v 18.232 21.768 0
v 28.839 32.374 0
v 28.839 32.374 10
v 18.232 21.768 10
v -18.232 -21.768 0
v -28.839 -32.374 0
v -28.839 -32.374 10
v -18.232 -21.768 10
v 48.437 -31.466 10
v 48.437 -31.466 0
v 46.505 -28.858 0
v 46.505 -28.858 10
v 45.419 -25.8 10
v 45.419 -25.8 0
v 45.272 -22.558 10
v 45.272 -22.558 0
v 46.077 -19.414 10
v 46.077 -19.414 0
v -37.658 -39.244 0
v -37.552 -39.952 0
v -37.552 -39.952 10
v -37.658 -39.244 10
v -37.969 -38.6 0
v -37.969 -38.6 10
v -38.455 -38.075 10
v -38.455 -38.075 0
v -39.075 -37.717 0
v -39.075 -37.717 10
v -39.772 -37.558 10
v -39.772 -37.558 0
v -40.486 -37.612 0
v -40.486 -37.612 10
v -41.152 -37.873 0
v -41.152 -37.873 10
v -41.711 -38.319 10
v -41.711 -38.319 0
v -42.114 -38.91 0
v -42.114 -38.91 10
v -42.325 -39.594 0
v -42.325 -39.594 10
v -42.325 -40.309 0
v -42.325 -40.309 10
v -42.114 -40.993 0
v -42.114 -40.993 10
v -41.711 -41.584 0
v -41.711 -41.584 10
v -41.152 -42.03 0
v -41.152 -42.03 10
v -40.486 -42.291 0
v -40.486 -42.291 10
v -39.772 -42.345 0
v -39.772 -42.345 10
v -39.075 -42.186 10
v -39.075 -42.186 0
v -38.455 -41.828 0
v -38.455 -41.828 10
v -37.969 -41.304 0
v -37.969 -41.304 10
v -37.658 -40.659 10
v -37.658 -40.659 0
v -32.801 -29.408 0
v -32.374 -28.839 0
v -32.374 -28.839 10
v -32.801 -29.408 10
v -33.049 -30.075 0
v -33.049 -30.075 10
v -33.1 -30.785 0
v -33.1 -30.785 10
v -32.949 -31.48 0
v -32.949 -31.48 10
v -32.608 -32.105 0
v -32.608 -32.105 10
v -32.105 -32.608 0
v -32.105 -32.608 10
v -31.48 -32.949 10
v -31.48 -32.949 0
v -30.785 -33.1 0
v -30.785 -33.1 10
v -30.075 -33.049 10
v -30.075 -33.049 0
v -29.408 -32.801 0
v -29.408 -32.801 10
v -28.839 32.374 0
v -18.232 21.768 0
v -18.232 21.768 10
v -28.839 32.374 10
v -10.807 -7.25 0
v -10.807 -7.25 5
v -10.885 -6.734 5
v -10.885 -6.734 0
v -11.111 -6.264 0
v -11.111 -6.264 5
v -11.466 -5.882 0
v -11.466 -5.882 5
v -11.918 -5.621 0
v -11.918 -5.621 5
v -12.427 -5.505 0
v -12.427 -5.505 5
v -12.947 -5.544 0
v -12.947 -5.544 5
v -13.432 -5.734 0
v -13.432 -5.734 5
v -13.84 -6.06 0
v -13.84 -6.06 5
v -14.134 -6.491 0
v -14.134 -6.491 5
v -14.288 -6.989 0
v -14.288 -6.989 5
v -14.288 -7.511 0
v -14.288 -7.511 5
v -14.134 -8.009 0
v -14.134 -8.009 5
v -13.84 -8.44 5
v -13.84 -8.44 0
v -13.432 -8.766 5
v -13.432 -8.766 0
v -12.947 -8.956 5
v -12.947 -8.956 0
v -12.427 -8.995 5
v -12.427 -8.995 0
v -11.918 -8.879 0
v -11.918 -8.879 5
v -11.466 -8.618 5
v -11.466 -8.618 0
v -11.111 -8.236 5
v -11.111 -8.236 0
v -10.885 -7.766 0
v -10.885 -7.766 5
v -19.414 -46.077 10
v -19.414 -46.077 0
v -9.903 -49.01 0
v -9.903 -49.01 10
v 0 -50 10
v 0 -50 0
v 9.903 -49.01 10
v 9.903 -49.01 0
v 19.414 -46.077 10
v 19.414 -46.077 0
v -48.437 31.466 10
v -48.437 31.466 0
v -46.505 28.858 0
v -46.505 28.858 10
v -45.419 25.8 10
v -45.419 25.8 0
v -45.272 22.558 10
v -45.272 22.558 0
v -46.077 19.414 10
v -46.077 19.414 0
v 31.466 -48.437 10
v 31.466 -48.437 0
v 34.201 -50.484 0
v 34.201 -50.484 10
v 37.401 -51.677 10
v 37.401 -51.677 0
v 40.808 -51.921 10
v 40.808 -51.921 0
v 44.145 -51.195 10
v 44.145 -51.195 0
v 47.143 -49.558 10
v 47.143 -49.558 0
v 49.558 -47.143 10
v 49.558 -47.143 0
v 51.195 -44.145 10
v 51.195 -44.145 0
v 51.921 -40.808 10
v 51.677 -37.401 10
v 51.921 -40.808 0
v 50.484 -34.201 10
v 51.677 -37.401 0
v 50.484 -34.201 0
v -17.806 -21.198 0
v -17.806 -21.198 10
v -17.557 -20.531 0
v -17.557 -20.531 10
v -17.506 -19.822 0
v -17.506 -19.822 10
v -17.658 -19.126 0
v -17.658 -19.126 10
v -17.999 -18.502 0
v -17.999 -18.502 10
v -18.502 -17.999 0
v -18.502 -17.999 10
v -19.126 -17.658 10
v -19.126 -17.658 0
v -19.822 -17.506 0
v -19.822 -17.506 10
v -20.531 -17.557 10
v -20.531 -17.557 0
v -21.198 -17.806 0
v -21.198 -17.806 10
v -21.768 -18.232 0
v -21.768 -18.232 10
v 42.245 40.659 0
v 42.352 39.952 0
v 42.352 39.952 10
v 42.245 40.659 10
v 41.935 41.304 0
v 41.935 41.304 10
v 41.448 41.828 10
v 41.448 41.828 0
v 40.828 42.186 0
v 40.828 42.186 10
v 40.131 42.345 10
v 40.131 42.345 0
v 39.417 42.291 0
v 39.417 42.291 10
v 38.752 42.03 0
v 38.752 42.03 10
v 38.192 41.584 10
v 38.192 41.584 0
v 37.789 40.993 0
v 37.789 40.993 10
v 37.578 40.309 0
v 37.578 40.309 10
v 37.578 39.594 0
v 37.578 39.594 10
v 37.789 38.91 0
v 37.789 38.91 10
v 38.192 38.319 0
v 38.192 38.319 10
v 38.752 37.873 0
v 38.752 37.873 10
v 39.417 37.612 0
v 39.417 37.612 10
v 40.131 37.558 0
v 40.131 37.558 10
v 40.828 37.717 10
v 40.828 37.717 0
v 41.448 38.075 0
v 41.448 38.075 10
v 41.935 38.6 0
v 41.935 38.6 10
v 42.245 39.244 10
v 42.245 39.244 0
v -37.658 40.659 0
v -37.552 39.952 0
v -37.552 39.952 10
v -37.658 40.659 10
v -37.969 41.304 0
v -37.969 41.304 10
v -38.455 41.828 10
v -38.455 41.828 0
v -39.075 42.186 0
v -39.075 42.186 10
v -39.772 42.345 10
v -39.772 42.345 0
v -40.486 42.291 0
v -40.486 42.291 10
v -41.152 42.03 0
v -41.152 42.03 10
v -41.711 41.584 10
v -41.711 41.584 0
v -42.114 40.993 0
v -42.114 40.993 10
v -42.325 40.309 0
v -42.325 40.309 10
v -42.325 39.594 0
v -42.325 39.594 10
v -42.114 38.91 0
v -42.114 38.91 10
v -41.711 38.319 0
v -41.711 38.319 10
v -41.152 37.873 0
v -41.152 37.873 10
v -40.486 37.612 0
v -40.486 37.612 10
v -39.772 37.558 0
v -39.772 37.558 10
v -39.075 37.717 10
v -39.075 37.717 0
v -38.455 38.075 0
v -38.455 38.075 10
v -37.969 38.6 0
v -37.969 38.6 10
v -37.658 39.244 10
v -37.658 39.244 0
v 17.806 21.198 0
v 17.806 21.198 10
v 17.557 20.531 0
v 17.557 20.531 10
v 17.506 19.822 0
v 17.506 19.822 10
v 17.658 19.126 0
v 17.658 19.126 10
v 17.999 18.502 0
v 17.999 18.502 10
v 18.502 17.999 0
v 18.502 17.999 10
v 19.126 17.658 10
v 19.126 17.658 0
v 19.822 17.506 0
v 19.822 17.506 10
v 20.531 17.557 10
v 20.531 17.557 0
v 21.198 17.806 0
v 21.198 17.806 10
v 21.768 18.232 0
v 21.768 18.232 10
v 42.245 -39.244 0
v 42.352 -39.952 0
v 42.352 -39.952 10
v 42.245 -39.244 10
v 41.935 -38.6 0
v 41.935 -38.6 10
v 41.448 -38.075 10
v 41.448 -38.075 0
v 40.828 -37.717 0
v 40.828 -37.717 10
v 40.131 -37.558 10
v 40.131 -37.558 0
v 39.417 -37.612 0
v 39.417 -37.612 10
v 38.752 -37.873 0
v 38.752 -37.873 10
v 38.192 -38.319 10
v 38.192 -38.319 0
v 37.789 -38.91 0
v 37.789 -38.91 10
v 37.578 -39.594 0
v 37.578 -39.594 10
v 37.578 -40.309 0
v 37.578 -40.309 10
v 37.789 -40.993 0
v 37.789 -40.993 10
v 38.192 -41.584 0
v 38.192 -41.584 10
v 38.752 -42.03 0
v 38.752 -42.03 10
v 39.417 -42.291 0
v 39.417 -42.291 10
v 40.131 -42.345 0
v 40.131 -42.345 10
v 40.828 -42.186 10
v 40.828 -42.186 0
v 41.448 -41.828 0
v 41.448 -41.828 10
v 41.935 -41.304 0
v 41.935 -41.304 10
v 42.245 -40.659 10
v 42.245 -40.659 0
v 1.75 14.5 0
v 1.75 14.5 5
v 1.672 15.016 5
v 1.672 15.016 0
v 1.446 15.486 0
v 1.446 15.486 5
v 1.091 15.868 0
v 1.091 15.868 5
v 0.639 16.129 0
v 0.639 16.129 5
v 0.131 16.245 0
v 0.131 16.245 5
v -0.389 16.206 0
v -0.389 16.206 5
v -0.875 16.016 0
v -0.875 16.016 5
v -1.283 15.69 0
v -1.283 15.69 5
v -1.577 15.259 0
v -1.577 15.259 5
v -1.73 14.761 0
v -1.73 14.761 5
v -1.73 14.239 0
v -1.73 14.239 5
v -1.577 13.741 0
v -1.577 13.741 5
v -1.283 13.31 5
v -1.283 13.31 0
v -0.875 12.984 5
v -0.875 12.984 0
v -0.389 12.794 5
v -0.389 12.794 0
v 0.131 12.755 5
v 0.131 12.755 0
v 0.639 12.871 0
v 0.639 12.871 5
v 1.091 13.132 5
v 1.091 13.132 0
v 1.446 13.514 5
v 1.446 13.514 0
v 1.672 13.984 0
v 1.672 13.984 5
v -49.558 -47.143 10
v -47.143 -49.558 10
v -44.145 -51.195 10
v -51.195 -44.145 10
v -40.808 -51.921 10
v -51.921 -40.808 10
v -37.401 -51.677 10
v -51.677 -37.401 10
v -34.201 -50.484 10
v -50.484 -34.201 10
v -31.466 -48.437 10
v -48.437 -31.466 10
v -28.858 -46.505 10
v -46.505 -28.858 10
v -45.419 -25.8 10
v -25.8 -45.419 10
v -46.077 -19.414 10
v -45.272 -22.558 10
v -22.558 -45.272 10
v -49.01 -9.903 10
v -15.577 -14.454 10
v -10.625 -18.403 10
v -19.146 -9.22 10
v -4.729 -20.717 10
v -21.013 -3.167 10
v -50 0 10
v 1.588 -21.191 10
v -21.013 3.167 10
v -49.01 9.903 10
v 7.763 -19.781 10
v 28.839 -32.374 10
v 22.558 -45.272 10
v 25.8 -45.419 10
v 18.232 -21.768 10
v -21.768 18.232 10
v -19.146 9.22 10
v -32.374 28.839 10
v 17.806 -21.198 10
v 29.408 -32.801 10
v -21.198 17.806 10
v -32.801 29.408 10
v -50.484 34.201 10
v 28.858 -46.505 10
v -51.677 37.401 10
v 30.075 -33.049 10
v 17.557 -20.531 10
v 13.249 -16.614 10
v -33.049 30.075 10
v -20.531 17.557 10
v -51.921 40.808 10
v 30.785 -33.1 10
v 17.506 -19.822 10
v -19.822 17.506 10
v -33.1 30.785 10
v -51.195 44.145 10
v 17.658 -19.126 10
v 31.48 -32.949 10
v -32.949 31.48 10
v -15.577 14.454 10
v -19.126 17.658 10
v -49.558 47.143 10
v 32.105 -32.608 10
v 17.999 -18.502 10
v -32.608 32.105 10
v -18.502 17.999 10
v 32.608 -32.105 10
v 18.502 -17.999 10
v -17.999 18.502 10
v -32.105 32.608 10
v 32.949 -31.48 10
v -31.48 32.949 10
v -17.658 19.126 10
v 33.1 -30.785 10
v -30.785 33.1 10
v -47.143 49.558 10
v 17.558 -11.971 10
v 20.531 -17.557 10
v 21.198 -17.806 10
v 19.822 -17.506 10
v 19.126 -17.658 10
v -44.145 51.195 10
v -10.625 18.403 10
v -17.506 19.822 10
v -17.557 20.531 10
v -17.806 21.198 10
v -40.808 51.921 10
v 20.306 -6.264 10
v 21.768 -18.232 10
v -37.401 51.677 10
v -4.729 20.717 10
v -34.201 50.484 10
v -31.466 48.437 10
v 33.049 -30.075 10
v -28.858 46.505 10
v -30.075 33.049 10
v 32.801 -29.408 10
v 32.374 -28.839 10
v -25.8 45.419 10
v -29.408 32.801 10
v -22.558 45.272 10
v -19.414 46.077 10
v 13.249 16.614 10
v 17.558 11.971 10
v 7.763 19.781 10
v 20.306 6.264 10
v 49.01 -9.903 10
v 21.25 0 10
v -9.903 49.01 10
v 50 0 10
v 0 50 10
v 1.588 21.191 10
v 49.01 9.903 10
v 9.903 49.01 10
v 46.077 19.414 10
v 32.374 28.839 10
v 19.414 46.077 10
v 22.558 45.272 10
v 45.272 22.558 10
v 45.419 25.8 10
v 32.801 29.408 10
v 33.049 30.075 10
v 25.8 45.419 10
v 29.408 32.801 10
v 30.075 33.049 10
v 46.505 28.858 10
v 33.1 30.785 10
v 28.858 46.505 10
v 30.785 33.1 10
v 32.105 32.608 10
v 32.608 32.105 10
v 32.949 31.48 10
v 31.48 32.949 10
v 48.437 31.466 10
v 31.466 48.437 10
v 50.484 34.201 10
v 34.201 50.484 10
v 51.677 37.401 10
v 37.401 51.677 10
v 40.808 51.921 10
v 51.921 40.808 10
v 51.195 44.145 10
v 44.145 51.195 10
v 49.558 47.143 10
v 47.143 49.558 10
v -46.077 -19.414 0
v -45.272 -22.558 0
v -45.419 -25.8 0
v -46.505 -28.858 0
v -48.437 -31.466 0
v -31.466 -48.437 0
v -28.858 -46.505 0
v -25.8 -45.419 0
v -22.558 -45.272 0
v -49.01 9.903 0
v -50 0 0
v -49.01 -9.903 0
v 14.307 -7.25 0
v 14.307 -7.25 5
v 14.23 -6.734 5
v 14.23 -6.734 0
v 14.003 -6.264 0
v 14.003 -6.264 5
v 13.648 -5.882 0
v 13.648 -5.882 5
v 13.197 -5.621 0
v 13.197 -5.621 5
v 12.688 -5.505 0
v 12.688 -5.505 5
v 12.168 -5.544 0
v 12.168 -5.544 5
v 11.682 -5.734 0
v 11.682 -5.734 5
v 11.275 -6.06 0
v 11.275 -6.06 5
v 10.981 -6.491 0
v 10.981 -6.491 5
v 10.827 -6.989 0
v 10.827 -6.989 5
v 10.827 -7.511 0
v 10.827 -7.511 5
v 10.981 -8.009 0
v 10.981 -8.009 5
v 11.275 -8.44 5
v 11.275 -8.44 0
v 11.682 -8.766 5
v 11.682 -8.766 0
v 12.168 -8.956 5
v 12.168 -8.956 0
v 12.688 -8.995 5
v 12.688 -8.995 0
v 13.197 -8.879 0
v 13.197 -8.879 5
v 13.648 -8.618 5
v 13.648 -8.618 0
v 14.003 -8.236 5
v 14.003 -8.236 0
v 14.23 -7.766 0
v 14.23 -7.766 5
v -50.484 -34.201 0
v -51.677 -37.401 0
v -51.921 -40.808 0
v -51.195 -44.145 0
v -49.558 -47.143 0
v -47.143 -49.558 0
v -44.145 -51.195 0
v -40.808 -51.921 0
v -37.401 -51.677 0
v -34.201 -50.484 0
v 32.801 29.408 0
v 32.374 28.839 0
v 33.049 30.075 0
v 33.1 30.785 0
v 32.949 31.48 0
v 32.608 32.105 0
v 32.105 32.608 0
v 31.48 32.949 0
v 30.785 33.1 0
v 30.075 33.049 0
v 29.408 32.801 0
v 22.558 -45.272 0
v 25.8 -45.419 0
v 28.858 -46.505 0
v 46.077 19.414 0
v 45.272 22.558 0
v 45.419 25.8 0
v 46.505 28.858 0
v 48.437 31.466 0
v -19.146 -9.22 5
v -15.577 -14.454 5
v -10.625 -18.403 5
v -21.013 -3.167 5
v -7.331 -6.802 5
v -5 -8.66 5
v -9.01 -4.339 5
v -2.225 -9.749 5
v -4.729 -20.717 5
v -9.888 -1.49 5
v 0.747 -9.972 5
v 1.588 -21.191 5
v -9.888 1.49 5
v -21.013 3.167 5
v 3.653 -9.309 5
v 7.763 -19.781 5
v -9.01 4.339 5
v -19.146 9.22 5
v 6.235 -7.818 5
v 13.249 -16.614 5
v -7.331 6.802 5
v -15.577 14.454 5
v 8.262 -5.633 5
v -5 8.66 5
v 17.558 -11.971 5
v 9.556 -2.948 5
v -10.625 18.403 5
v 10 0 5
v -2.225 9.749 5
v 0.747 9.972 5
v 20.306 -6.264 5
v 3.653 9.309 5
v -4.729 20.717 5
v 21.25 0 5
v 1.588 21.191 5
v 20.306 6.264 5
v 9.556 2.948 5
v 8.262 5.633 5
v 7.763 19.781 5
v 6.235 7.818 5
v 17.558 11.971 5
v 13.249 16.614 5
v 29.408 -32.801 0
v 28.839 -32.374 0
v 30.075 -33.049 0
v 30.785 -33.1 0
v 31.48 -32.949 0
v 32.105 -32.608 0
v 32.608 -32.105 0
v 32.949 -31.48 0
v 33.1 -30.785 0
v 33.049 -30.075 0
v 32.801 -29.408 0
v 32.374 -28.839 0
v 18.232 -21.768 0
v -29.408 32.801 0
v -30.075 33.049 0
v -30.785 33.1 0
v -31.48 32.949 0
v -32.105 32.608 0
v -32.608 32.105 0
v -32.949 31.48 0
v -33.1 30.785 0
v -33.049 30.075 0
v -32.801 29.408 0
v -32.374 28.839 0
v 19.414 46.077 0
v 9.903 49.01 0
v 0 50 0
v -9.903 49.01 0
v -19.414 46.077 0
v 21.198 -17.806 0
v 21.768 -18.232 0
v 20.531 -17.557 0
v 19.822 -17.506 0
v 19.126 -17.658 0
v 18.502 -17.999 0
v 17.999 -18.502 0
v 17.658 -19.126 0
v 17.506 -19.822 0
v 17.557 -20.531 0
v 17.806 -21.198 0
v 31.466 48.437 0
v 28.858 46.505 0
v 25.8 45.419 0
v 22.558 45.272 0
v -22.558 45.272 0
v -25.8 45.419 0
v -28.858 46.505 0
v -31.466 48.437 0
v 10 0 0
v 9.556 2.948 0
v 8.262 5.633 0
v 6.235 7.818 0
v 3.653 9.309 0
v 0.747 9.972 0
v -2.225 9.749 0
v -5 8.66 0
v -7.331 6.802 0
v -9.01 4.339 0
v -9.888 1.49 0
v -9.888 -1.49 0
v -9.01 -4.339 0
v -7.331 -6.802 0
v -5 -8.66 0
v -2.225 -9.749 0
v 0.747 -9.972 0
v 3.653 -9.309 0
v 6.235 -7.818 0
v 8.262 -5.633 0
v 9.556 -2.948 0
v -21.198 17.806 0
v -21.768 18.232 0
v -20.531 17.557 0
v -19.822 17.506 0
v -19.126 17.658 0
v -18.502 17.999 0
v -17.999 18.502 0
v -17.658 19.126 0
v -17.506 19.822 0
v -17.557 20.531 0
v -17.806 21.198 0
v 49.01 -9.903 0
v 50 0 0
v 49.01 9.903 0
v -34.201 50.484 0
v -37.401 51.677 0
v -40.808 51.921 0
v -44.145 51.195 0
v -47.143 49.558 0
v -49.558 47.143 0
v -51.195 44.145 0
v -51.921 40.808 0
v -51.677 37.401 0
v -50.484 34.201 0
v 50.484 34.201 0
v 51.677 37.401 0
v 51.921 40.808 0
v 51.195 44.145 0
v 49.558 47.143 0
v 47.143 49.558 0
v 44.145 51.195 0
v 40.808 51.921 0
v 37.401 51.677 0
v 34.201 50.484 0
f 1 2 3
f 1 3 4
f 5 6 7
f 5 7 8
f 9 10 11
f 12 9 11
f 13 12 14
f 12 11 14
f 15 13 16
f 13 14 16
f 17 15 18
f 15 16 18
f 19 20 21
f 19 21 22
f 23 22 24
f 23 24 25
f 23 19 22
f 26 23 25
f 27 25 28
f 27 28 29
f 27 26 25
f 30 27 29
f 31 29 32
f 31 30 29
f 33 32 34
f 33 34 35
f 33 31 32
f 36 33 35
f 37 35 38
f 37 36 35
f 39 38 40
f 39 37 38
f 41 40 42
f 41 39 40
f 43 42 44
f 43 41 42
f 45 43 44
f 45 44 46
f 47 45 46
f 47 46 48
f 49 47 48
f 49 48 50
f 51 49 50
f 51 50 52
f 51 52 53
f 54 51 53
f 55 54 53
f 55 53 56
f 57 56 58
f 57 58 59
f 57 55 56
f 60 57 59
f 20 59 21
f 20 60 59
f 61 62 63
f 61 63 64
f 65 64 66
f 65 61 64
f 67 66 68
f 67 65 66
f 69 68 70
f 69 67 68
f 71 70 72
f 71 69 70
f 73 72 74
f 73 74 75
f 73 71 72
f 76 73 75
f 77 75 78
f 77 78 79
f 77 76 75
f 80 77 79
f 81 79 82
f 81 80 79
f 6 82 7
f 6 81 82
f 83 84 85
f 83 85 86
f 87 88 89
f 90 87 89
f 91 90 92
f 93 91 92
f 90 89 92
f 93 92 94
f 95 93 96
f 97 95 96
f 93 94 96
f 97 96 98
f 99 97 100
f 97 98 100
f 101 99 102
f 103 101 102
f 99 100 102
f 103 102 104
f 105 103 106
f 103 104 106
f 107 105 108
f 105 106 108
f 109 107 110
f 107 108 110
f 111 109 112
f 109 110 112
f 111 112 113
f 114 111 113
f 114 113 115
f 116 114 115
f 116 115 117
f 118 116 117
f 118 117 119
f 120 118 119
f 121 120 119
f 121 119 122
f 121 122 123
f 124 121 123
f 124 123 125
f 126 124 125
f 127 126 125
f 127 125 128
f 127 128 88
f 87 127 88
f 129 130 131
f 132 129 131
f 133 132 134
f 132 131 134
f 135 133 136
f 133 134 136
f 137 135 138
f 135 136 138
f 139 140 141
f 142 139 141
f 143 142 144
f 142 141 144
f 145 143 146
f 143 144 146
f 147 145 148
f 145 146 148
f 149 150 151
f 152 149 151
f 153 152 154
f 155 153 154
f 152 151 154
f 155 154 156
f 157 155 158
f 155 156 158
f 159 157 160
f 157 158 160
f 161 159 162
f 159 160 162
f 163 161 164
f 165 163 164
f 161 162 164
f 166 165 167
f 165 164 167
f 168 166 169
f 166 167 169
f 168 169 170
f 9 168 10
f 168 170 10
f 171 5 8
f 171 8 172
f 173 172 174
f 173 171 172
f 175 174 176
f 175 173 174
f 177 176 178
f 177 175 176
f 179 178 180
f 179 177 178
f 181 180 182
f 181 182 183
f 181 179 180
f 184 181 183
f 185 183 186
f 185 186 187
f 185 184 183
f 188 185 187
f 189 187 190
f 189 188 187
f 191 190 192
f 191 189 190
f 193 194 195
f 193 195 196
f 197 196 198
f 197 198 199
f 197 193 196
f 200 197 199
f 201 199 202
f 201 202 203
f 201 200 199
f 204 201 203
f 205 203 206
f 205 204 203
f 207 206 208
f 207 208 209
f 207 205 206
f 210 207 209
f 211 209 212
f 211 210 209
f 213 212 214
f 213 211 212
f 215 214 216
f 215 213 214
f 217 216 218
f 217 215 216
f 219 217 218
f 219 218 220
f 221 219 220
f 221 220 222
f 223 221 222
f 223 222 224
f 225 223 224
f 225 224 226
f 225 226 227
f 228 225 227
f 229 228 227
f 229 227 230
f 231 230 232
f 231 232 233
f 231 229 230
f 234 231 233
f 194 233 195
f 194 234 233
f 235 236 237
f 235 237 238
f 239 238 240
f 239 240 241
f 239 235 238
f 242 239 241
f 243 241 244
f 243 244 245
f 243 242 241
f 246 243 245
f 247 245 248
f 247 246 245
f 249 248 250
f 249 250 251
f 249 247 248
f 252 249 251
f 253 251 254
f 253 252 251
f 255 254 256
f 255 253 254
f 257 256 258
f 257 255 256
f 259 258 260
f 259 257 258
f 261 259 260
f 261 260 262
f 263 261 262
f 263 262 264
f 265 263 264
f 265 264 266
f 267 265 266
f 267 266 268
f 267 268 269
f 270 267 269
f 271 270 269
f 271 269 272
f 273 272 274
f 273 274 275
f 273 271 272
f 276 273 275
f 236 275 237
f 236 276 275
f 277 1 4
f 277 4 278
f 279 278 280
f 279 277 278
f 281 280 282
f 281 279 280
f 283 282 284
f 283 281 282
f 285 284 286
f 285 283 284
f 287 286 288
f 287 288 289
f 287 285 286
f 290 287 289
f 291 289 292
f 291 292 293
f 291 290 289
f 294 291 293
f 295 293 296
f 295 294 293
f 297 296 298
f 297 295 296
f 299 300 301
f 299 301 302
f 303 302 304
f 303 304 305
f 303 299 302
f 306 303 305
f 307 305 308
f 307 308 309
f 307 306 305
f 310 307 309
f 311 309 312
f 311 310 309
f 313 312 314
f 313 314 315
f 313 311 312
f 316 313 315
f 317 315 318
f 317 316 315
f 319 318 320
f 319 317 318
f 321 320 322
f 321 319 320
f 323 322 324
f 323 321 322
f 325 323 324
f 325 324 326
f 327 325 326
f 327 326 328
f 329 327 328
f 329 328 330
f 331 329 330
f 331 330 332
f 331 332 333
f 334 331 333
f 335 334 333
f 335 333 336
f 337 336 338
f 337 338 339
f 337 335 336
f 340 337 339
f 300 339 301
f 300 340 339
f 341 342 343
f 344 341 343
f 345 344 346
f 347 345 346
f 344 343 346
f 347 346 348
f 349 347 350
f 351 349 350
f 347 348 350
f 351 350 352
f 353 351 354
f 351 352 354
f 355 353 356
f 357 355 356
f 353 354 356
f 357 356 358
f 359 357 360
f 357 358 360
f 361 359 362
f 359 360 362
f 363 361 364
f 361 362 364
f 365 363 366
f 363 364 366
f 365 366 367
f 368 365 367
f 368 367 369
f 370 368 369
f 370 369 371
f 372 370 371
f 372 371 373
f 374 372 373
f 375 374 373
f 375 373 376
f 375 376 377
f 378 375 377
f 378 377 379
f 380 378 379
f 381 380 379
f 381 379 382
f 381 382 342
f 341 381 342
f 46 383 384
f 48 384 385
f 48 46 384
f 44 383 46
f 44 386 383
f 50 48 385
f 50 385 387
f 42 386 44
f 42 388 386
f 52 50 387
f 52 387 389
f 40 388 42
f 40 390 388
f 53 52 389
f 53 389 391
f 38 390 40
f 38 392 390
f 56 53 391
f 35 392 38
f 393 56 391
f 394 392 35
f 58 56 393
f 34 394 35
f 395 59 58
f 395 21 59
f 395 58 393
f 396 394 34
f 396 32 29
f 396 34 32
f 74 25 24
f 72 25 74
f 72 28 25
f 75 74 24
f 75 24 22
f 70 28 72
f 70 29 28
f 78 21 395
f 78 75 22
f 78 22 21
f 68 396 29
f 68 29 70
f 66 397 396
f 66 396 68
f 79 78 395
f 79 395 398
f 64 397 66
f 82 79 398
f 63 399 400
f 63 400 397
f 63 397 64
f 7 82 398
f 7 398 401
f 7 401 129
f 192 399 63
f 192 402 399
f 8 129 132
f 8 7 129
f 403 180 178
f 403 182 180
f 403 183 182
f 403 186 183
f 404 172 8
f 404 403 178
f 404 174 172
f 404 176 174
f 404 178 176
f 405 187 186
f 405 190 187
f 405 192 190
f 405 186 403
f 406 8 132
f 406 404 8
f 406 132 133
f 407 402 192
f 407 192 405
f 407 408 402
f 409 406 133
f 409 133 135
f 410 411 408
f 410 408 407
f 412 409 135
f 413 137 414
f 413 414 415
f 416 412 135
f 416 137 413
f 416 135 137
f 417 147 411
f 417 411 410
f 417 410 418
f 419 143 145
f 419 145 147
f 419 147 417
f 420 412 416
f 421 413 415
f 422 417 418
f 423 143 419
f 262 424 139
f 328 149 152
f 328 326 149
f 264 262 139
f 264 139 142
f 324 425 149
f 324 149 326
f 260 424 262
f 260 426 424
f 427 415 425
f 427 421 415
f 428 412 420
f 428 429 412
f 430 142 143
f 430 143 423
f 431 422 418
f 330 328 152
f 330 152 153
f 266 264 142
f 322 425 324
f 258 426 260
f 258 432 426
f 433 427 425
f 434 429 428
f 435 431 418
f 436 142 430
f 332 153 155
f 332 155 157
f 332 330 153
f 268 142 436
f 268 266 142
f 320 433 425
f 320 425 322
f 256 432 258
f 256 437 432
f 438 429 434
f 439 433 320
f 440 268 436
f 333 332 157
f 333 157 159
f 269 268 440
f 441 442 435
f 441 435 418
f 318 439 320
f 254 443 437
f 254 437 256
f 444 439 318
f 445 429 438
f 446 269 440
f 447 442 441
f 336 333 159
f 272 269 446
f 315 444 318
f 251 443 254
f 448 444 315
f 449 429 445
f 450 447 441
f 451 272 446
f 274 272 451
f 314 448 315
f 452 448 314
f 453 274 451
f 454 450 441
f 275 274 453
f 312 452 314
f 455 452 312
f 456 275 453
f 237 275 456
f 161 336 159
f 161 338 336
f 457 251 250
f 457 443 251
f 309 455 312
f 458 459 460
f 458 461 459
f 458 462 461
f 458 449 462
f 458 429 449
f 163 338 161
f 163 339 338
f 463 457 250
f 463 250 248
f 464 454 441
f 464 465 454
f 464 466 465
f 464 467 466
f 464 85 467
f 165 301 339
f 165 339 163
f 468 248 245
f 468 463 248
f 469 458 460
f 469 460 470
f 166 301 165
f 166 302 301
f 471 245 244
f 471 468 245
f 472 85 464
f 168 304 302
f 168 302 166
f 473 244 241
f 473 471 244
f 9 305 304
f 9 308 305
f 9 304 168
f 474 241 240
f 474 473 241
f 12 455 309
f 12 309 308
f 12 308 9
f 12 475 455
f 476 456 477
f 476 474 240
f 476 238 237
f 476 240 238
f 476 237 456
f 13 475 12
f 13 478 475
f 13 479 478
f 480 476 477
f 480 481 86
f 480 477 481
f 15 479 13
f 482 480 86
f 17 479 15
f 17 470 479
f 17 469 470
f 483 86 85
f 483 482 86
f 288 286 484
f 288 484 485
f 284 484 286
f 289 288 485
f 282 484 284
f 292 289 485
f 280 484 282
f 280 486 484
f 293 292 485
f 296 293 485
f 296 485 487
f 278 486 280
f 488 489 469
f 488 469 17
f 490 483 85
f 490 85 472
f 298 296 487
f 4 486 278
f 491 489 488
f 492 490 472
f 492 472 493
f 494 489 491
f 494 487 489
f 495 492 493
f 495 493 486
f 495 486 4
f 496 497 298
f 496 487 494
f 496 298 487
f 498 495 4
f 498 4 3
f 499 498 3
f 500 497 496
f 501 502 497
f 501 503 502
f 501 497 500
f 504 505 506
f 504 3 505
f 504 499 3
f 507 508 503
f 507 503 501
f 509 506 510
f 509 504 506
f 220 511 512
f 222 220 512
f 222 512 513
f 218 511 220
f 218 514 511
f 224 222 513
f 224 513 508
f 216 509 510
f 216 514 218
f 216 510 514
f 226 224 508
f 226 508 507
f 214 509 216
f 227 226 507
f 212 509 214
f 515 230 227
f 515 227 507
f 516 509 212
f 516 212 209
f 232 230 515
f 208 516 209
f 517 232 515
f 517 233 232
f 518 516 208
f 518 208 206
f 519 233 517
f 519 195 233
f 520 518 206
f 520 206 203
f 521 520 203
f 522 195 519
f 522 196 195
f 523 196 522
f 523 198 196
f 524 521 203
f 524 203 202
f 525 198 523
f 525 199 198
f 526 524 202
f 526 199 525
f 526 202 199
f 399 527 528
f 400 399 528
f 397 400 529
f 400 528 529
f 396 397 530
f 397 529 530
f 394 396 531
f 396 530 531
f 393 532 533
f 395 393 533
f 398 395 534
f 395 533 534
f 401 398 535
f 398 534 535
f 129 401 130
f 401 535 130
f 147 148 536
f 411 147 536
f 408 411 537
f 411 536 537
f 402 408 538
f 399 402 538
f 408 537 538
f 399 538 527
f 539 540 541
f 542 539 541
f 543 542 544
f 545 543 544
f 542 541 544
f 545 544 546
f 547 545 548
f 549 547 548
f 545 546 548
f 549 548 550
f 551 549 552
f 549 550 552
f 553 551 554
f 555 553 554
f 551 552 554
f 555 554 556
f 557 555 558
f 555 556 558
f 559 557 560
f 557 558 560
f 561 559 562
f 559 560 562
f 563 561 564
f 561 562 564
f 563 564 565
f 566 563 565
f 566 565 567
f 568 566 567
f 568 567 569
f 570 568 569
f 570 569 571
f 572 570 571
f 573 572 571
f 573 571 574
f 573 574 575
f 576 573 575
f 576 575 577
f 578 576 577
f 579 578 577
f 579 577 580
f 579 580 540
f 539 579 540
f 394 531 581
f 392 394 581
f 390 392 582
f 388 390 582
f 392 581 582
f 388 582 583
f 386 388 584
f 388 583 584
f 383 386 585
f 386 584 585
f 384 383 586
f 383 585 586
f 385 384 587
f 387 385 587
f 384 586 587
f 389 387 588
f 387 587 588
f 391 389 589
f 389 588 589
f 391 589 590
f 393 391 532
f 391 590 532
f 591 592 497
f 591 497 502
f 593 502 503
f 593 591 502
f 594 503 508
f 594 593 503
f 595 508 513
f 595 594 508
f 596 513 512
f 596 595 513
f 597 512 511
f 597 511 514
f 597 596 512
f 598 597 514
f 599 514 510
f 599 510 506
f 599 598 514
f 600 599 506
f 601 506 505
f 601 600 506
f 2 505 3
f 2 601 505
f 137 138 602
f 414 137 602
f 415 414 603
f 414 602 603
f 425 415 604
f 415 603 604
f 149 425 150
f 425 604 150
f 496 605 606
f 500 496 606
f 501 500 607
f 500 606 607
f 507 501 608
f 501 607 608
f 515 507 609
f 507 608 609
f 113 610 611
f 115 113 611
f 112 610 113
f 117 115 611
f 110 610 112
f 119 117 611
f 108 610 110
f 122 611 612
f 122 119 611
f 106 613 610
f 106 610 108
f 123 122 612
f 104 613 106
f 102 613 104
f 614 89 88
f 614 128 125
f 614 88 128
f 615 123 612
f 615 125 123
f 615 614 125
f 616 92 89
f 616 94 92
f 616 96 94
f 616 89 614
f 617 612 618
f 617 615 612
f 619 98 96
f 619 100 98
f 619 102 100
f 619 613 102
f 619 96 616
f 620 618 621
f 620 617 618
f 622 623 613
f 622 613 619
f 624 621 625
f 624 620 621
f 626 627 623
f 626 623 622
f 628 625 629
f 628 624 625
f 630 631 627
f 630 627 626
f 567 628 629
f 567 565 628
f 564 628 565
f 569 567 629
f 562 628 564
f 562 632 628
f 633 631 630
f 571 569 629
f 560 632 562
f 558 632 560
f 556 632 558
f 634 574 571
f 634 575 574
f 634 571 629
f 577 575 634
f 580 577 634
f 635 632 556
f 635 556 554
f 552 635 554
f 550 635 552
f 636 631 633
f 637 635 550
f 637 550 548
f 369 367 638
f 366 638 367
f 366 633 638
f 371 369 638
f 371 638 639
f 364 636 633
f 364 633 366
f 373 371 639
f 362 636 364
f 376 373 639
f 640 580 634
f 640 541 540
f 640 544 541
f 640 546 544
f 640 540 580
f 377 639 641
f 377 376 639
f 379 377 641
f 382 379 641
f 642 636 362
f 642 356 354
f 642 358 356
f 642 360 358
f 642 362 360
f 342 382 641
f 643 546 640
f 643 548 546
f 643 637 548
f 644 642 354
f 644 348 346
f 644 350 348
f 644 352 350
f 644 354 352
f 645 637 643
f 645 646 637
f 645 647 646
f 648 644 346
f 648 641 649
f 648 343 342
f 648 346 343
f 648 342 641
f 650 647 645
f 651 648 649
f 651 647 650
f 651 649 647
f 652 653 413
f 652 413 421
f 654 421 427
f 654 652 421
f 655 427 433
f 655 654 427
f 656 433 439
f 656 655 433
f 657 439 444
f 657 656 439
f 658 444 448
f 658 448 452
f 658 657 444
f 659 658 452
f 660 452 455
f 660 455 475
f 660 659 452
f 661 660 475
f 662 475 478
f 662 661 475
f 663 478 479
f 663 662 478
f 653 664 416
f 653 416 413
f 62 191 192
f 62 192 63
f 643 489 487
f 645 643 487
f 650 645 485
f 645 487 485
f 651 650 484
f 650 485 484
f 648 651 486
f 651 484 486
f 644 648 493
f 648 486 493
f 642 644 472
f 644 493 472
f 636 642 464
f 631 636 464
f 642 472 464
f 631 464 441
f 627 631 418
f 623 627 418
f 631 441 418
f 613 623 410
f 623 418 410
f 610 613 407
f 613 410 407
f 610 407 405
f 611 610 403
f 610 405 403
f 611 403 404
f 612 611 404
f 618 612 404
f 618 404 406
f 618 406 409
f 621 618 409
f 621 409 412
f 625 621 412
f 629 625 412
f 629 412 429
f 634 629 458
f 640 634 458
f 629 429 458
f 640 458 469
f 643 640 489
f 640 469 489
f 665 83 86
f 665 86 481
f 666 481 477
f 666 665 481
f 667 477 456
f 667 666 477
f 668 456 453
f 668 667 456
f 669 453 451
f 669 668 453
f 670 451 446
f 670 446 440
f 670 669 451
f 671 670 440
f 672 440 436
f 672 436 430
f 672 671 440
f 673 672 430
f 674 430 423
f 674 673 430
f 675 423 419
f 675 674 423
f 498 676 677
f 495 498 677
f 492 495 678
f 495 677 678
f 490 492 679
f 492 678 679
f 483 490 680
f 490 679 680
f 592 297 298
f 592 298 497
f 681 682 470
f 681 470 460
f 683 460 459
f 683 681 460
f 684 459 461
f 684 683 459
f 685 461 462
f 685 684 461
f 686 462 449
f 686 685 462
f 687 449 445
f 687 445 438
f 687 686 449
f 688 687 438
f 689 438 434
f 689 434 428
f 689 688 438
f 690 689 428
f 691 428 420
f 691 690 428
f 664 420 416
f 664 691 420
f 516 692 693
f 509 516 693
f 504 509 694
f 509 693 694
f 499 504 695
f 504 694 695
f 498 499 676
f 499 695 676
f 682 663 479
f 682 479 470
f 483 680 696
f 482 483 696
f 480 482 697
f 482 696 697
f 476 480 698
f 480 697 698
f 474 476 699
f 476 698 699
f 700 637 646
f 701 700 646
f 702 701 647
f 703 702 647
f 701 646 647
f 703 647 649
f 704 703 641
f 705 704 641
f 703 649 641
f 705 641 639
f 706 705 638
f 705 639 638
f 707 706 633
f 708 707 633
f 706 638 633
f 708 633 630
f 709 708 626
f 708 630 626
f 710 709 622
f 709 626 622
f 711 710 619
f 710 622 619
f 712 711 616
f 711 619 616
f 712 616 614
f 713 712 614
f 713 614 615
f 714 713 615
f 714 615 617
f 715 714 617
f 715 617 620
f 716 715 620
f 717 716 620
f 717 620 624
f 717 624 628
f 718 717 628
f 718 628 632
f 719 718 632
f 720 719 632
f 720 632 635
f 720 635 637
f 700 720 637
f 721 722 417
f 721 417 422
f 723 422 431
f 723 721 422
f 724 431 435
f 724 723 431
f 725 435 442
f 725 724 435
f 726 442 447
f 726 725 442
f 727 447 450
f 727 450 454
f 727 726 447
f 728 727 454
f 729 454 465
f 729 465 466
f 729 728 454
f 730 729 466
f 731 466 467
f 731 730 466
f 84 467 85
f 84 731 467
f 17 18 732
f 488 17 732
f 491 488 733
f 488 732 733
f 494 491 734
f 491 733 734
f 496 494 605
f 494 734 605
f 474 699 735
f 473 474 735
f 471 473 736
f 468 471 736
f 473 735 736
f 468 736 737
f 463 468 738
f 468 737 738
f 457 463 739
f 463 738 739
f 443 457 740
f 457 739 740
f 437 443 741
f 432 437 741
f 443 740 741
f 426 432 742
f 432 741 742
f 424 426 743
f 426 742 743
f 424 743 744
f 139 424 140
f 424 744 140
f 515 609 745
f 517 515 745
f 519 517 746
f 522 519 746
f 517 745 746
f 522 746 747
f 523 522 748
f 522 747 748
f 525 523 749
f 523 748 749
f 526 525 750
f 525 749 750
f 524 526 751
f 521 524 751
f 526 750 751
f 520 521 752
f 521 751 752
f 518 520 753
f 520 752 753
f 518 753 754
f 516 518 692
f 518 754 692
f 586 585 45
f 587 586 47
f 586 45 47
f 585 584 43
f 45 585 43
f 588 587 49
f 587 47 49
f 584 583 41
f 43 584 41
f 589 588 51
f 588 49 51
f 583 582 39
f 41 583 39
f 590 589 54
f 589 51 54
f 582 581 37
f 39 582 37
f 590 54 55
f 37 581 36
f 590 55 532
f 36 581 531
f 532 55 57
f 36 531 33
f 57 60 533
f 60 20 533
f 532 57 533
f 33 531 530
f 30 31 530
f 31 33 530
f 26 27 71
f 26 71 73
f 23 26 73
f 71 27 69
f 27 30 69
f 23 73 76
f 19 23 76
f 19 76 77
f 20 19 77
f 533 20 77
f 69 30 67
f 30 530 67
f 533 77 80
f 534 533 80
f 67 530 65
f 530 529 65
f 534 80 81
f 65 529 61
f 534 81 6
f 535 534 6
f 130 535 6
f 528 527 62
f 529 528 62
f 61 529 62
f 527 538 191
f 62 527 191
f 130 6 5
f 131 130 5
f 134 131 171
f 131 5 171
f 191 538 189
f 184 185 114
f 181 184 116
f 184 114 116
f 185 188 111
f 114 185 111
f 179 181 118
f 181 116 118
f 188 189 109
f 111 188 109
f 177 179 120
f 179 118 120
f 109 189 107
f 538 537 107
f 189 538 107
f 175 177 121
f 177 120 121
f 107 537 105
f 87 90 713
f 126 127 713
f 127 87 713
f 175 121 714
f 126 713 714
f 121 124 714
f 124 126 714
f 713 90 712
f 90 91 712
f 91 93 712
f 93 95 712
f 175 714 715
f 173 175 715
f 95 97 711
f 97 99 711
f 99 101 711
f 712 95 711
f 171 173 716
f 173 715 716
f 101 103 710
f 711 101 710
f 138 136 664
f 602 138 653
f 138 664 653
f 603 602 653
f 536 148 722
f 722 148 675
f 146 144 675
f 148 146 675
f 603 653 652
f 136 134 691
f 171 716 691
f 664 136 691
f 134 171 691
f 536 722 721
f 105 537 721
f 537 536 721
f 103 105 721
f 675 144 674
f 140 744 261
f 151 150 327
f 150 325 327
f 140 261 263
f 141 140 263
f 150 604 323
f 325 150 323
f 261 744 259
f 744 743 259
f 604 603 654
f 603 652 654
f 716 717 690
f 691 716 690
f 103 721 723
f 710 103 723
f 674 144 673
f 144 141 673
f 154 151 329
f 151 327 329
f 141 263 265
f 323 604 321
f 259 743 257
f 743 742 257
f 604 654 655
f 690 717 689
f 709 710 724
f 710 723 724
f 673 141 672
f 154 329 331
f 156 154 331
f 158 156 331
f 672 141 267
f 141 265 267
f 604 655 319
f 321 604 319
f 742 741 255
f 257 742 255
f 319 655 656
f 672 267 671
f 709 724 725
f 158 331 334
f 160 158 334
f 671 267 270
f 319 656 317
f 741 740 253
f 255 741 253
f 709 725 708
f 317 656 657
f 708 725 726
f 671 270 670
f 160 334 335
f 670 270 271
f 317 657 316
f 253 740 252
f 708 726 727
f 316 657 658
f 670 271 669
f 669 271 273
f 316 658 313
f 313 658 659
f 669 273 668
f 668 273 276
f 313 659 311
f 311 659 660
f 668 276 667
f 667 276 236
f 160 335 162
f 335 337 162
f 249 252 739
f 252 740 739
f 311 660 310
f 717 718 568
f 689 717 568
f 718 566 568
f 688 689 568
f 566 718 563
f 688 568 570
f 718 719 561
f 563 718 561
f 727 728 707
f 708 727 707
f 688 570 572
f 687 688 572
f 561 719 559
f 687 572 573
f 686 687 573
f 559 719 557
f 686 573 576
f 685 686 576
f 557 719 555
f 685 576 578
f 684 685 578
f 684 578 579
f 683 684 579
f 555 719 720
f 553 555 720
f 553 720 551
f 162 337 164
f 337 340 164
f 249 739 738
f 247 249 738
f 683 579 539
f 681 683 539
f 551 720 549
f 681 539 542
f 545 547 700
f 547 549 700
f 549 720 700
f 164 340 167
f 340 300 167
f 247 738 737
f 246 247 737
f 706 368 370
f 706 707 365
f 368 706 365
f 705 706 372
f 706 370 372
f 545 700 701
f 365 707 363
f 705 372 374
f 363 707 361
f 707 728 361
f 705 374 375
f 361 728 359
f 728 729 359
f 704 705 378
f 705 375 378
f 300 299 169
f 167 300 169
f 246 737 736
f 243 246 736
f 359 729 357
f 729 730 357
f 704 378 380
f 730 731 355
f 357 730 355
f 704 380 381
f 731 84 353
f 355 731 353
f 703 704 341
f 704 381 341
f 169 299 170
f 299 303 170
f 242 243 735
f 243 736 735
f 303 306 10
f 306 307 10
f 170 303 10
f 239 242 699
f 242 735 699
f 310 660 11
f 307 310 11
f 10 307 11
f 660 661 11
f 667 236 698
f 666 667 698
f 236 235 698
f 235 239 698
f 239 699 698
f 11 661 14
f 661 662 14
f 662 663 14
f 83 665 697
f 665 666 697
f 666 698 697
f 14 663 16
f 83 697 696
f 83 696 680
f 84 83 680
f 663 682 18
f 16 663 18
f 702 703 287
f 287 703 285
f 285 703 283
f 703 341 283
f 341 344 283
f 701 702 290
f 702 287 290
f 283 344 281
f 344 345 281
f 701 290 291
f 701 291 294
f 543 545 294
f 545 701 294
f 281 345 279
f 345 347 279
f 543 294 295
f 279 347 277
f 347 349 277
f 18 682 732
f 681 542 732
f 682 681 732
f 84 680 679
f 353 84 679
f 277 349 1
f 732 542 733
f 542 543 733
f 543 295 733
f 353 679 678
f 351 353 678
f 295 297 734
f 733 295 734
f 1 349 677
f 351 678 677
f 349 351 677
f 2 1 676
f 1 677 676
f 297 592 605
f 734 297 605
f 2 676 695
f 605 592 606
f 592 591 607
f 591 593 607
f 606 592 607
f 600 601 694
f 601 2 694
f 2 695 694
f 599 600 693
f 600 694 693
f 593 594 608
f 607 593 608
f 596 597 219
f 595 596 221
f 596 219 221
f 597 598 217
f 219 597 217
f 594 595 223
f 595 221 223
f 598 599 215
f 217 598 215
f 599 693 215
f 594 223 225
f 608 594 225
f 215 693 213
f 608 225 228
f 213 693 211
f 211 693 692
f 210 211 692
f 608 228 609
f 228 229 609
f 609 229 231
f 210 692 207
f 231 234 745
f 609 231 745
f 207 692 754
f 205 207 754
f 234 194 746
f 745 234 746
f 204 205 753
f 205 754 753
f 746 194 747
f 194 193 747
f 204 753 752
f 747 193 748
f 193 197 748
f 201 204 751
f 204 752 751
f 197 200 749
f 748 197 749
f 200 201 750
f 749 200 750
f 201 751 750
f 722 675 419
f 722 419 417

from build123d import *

# Parameters (mm, degrees)
SKETCH1_R           = 2.4
BOSS_EXTRUDE1_DEPTH = 10
SKETCH2_R           = 21.25
CUT_EXTRUDE1_DEPTH  = 5
SKETCH2_3_R         = 1.75
CUT_EXTRUDE2_DEPTH  = 75.1479844
SKETCH3_R           = 10
CUT_EXTRUDE3_DEPTH  = 74.640502379


with BuildPart() as part:
    # Sketch1 → Boss-Extrude1 (new body)
    with BuildSketch(Plane.XY):
        with BuildLine():
            ThreePointArc((46.077281732, -19.413503243), (50, 0), (46.077281732, 19.413503243))
            ThreePointArc((46.077281732, 19.413503243), (45.41900176, 25.799706685), (48.436814511, 31.466251763))
            ThreePointArc((48.436814511, 31.466251763), (48.436814511, 48.436814511), (31.466251763, 48.436814511))
            ThreePointArc((31.466251763, 48.436814511), (25.799706685, 45.41900176), (19.413503243, 46.077281732))
            ThreePointArc((19.413503243, 46.077281732), (0, 50), (-19.413503243, 46.077281732))
            ThreePointArc((-19.413503243, 46.077281732), (-25.799706685, 45.41900176), (-31.466251763, 48.436814511))
            ThreePointArc((-31.466251763, 48.436814511), (-48.436814511, 48.436814511), (-48.436814511, 31.466251763))
            ThreePointArc((-48.436814511, 31.466251763), (-45.41900176, 25.799706685), (-46.077281732, 19.413503243))
            ThreePointArc((-46.077281732, 19.413503243), (-50, 0), (-46.077281732, -19.413503243))
            ThreePointArc((-46.077281732, -19.413503243), (-45.41900176, -25.799706685), (-48.436814511, -31.466251763))
            ThreePointArc((-48.436814511, -31.466251763), (-48.436814511, -48.436814511), (-31.466251763, -48.436814511))
            ThreePointArc((-31.466251763, -48.436814511), (-25.799706685, -45.41900176), (-19.413503243, -46.077281732))
            ThreePointArc((-19.413503243, -46.077281732), (0, -50), (19.413503243, -46.077281732))
            ThreePointArc((19.413503243, -46.077281732), (25.799706685, -45.41900176), (31.466251763, -48.436814511))
            ThreePointArc((31.466251763, -48.436814511), (48.436814511, -48.436814511), (48.436814511, -31.466251763))
            ThreePointArc((48.436814511, -31.466251763), (45.41900176, -25.799706685), (46.077281732, -19.413503243))
        make_face()
        with BuildLine():
            ThreePointArc((-21.767766953, -18.232233047), (-18.232233047, -18.232233047), (-18.232233047, -21.767766953))
            Line((-18.232233047, -21.767766953), (-28.838834765, -32.374368671))
            ThreePointArc((-28.838834765, -32.374368671), (-32.374368671, -32.374368671), (-32.374368671, -28.838834765))
            Line((-32.374368671, -28.838834765), (-21.767766953, -18.232233047))
        make_face(mode=Mode.SUBTRACT)
        with BuildLine():
            ThreePointArc((18.232233047, -21.767766953), (18.232233047, -18.232233047), (21.767766953, -18.232233047))
            Line((21.767766953, -18.232233047), (32.374368671, -28.838834765))
            ThreePointArc((32.374368671, -28.838834765), (32.374368671, -32.374368671), (28.838834765, -32.374368671))
            Line((28.838834765, -32.374368671), (18.232233047, -21.767766953))
        make_face(mode=Mode.SUBTRACT)
        with BuildLine():
            ThreePointArc((-18.232233047, 21.767766953), (-18.232233047, 18.232233047), (-21.767766953, 18.232233047))
            Line((-21.767766953, 18.232233047), (-32.374368671, 28.838834765))
            ThreePointArc((-32.374368671, 28.838834765), (-32.374368671, 32.374368671), (-28.838834765, 32.374368671))
            Line((-28.838834765, 32.374368671), (-18.232233047, 21.767766953))
        make_face(mode=Mode.SUBTRACT)
        with BuildLine():
            ThreePointArc((21.767766953, 18.232233047), (18.232233047, 18.232233047), (18.232233047, 21.767766953))
            Line((18.232233047, 21.767766953), (28.838834765, 32.374368671))
            ThreePointArc((28.838834765, 32.374368671), (32.374368671, 32.374368671), (32.374368671, 28.838834765))
            Line((32.374368671, 28.838834765), (21.767766953, 18.232233047))
        make_face(mode=Mode.SUBTRACT)
        with Locations((39.951533137, -39.951533137)):
            Circle(SKETCH1_R, mode=Mode.SUBTRACT)
        with Locations((-39.951533137, -39.951533137)):
            Circle(SKETCH1_R, mode=Mode.SUBTRACT)
        with Locations((-39.951533137, 39.951533137)):
            Circle(SKETCH1_R, mode=Mode.SUBTRACT)
        with Locations((39.951533137, 39.951533137)):
            Circle(SKETCH1_R, mode=Mode.SUBTRACT)
    extrude(amount=BOSS_EXTRUDE1_DEPTH)

    # Sketch2 → Cut-Extrude1 (cut)
    with BuildSketch(Plane.XY.offset(10)):
        Circle(SKETCH2_R)
    extrude(amount=-CUT_EXTRUDE1_DEPTH, mode=Mode.SUBTRACT)

    # Sketch2<3> → Cut-Extrude2 (cut, through all)
    with BuildSketch(Plane.XY.offset(10)):
        with Locations((0, 14.5)):
            Circle(SKETCH2_3_R)
        with Locations((12.557368355, -7.25)):
            Circle(SKETCH2_3_R)
        with Locations((-12.557368355, -7.25)):
            Circle(SKETCH2_3_R)
    extrude(amount=-CUT_EXTRUDE2_DEPTH, mode=Mode.SUBTRACT)

    # Sketch3 → Cut-Extrude3 (cut, through all)
    with BuildSketch(Plane.XY.offset(5)):
        Circle(SKETCH3_R)
    extrude(amount=-CUT_EXTRUDE3_DEPTH, mode=Mode.SUBTRACT)


solid = part.part
